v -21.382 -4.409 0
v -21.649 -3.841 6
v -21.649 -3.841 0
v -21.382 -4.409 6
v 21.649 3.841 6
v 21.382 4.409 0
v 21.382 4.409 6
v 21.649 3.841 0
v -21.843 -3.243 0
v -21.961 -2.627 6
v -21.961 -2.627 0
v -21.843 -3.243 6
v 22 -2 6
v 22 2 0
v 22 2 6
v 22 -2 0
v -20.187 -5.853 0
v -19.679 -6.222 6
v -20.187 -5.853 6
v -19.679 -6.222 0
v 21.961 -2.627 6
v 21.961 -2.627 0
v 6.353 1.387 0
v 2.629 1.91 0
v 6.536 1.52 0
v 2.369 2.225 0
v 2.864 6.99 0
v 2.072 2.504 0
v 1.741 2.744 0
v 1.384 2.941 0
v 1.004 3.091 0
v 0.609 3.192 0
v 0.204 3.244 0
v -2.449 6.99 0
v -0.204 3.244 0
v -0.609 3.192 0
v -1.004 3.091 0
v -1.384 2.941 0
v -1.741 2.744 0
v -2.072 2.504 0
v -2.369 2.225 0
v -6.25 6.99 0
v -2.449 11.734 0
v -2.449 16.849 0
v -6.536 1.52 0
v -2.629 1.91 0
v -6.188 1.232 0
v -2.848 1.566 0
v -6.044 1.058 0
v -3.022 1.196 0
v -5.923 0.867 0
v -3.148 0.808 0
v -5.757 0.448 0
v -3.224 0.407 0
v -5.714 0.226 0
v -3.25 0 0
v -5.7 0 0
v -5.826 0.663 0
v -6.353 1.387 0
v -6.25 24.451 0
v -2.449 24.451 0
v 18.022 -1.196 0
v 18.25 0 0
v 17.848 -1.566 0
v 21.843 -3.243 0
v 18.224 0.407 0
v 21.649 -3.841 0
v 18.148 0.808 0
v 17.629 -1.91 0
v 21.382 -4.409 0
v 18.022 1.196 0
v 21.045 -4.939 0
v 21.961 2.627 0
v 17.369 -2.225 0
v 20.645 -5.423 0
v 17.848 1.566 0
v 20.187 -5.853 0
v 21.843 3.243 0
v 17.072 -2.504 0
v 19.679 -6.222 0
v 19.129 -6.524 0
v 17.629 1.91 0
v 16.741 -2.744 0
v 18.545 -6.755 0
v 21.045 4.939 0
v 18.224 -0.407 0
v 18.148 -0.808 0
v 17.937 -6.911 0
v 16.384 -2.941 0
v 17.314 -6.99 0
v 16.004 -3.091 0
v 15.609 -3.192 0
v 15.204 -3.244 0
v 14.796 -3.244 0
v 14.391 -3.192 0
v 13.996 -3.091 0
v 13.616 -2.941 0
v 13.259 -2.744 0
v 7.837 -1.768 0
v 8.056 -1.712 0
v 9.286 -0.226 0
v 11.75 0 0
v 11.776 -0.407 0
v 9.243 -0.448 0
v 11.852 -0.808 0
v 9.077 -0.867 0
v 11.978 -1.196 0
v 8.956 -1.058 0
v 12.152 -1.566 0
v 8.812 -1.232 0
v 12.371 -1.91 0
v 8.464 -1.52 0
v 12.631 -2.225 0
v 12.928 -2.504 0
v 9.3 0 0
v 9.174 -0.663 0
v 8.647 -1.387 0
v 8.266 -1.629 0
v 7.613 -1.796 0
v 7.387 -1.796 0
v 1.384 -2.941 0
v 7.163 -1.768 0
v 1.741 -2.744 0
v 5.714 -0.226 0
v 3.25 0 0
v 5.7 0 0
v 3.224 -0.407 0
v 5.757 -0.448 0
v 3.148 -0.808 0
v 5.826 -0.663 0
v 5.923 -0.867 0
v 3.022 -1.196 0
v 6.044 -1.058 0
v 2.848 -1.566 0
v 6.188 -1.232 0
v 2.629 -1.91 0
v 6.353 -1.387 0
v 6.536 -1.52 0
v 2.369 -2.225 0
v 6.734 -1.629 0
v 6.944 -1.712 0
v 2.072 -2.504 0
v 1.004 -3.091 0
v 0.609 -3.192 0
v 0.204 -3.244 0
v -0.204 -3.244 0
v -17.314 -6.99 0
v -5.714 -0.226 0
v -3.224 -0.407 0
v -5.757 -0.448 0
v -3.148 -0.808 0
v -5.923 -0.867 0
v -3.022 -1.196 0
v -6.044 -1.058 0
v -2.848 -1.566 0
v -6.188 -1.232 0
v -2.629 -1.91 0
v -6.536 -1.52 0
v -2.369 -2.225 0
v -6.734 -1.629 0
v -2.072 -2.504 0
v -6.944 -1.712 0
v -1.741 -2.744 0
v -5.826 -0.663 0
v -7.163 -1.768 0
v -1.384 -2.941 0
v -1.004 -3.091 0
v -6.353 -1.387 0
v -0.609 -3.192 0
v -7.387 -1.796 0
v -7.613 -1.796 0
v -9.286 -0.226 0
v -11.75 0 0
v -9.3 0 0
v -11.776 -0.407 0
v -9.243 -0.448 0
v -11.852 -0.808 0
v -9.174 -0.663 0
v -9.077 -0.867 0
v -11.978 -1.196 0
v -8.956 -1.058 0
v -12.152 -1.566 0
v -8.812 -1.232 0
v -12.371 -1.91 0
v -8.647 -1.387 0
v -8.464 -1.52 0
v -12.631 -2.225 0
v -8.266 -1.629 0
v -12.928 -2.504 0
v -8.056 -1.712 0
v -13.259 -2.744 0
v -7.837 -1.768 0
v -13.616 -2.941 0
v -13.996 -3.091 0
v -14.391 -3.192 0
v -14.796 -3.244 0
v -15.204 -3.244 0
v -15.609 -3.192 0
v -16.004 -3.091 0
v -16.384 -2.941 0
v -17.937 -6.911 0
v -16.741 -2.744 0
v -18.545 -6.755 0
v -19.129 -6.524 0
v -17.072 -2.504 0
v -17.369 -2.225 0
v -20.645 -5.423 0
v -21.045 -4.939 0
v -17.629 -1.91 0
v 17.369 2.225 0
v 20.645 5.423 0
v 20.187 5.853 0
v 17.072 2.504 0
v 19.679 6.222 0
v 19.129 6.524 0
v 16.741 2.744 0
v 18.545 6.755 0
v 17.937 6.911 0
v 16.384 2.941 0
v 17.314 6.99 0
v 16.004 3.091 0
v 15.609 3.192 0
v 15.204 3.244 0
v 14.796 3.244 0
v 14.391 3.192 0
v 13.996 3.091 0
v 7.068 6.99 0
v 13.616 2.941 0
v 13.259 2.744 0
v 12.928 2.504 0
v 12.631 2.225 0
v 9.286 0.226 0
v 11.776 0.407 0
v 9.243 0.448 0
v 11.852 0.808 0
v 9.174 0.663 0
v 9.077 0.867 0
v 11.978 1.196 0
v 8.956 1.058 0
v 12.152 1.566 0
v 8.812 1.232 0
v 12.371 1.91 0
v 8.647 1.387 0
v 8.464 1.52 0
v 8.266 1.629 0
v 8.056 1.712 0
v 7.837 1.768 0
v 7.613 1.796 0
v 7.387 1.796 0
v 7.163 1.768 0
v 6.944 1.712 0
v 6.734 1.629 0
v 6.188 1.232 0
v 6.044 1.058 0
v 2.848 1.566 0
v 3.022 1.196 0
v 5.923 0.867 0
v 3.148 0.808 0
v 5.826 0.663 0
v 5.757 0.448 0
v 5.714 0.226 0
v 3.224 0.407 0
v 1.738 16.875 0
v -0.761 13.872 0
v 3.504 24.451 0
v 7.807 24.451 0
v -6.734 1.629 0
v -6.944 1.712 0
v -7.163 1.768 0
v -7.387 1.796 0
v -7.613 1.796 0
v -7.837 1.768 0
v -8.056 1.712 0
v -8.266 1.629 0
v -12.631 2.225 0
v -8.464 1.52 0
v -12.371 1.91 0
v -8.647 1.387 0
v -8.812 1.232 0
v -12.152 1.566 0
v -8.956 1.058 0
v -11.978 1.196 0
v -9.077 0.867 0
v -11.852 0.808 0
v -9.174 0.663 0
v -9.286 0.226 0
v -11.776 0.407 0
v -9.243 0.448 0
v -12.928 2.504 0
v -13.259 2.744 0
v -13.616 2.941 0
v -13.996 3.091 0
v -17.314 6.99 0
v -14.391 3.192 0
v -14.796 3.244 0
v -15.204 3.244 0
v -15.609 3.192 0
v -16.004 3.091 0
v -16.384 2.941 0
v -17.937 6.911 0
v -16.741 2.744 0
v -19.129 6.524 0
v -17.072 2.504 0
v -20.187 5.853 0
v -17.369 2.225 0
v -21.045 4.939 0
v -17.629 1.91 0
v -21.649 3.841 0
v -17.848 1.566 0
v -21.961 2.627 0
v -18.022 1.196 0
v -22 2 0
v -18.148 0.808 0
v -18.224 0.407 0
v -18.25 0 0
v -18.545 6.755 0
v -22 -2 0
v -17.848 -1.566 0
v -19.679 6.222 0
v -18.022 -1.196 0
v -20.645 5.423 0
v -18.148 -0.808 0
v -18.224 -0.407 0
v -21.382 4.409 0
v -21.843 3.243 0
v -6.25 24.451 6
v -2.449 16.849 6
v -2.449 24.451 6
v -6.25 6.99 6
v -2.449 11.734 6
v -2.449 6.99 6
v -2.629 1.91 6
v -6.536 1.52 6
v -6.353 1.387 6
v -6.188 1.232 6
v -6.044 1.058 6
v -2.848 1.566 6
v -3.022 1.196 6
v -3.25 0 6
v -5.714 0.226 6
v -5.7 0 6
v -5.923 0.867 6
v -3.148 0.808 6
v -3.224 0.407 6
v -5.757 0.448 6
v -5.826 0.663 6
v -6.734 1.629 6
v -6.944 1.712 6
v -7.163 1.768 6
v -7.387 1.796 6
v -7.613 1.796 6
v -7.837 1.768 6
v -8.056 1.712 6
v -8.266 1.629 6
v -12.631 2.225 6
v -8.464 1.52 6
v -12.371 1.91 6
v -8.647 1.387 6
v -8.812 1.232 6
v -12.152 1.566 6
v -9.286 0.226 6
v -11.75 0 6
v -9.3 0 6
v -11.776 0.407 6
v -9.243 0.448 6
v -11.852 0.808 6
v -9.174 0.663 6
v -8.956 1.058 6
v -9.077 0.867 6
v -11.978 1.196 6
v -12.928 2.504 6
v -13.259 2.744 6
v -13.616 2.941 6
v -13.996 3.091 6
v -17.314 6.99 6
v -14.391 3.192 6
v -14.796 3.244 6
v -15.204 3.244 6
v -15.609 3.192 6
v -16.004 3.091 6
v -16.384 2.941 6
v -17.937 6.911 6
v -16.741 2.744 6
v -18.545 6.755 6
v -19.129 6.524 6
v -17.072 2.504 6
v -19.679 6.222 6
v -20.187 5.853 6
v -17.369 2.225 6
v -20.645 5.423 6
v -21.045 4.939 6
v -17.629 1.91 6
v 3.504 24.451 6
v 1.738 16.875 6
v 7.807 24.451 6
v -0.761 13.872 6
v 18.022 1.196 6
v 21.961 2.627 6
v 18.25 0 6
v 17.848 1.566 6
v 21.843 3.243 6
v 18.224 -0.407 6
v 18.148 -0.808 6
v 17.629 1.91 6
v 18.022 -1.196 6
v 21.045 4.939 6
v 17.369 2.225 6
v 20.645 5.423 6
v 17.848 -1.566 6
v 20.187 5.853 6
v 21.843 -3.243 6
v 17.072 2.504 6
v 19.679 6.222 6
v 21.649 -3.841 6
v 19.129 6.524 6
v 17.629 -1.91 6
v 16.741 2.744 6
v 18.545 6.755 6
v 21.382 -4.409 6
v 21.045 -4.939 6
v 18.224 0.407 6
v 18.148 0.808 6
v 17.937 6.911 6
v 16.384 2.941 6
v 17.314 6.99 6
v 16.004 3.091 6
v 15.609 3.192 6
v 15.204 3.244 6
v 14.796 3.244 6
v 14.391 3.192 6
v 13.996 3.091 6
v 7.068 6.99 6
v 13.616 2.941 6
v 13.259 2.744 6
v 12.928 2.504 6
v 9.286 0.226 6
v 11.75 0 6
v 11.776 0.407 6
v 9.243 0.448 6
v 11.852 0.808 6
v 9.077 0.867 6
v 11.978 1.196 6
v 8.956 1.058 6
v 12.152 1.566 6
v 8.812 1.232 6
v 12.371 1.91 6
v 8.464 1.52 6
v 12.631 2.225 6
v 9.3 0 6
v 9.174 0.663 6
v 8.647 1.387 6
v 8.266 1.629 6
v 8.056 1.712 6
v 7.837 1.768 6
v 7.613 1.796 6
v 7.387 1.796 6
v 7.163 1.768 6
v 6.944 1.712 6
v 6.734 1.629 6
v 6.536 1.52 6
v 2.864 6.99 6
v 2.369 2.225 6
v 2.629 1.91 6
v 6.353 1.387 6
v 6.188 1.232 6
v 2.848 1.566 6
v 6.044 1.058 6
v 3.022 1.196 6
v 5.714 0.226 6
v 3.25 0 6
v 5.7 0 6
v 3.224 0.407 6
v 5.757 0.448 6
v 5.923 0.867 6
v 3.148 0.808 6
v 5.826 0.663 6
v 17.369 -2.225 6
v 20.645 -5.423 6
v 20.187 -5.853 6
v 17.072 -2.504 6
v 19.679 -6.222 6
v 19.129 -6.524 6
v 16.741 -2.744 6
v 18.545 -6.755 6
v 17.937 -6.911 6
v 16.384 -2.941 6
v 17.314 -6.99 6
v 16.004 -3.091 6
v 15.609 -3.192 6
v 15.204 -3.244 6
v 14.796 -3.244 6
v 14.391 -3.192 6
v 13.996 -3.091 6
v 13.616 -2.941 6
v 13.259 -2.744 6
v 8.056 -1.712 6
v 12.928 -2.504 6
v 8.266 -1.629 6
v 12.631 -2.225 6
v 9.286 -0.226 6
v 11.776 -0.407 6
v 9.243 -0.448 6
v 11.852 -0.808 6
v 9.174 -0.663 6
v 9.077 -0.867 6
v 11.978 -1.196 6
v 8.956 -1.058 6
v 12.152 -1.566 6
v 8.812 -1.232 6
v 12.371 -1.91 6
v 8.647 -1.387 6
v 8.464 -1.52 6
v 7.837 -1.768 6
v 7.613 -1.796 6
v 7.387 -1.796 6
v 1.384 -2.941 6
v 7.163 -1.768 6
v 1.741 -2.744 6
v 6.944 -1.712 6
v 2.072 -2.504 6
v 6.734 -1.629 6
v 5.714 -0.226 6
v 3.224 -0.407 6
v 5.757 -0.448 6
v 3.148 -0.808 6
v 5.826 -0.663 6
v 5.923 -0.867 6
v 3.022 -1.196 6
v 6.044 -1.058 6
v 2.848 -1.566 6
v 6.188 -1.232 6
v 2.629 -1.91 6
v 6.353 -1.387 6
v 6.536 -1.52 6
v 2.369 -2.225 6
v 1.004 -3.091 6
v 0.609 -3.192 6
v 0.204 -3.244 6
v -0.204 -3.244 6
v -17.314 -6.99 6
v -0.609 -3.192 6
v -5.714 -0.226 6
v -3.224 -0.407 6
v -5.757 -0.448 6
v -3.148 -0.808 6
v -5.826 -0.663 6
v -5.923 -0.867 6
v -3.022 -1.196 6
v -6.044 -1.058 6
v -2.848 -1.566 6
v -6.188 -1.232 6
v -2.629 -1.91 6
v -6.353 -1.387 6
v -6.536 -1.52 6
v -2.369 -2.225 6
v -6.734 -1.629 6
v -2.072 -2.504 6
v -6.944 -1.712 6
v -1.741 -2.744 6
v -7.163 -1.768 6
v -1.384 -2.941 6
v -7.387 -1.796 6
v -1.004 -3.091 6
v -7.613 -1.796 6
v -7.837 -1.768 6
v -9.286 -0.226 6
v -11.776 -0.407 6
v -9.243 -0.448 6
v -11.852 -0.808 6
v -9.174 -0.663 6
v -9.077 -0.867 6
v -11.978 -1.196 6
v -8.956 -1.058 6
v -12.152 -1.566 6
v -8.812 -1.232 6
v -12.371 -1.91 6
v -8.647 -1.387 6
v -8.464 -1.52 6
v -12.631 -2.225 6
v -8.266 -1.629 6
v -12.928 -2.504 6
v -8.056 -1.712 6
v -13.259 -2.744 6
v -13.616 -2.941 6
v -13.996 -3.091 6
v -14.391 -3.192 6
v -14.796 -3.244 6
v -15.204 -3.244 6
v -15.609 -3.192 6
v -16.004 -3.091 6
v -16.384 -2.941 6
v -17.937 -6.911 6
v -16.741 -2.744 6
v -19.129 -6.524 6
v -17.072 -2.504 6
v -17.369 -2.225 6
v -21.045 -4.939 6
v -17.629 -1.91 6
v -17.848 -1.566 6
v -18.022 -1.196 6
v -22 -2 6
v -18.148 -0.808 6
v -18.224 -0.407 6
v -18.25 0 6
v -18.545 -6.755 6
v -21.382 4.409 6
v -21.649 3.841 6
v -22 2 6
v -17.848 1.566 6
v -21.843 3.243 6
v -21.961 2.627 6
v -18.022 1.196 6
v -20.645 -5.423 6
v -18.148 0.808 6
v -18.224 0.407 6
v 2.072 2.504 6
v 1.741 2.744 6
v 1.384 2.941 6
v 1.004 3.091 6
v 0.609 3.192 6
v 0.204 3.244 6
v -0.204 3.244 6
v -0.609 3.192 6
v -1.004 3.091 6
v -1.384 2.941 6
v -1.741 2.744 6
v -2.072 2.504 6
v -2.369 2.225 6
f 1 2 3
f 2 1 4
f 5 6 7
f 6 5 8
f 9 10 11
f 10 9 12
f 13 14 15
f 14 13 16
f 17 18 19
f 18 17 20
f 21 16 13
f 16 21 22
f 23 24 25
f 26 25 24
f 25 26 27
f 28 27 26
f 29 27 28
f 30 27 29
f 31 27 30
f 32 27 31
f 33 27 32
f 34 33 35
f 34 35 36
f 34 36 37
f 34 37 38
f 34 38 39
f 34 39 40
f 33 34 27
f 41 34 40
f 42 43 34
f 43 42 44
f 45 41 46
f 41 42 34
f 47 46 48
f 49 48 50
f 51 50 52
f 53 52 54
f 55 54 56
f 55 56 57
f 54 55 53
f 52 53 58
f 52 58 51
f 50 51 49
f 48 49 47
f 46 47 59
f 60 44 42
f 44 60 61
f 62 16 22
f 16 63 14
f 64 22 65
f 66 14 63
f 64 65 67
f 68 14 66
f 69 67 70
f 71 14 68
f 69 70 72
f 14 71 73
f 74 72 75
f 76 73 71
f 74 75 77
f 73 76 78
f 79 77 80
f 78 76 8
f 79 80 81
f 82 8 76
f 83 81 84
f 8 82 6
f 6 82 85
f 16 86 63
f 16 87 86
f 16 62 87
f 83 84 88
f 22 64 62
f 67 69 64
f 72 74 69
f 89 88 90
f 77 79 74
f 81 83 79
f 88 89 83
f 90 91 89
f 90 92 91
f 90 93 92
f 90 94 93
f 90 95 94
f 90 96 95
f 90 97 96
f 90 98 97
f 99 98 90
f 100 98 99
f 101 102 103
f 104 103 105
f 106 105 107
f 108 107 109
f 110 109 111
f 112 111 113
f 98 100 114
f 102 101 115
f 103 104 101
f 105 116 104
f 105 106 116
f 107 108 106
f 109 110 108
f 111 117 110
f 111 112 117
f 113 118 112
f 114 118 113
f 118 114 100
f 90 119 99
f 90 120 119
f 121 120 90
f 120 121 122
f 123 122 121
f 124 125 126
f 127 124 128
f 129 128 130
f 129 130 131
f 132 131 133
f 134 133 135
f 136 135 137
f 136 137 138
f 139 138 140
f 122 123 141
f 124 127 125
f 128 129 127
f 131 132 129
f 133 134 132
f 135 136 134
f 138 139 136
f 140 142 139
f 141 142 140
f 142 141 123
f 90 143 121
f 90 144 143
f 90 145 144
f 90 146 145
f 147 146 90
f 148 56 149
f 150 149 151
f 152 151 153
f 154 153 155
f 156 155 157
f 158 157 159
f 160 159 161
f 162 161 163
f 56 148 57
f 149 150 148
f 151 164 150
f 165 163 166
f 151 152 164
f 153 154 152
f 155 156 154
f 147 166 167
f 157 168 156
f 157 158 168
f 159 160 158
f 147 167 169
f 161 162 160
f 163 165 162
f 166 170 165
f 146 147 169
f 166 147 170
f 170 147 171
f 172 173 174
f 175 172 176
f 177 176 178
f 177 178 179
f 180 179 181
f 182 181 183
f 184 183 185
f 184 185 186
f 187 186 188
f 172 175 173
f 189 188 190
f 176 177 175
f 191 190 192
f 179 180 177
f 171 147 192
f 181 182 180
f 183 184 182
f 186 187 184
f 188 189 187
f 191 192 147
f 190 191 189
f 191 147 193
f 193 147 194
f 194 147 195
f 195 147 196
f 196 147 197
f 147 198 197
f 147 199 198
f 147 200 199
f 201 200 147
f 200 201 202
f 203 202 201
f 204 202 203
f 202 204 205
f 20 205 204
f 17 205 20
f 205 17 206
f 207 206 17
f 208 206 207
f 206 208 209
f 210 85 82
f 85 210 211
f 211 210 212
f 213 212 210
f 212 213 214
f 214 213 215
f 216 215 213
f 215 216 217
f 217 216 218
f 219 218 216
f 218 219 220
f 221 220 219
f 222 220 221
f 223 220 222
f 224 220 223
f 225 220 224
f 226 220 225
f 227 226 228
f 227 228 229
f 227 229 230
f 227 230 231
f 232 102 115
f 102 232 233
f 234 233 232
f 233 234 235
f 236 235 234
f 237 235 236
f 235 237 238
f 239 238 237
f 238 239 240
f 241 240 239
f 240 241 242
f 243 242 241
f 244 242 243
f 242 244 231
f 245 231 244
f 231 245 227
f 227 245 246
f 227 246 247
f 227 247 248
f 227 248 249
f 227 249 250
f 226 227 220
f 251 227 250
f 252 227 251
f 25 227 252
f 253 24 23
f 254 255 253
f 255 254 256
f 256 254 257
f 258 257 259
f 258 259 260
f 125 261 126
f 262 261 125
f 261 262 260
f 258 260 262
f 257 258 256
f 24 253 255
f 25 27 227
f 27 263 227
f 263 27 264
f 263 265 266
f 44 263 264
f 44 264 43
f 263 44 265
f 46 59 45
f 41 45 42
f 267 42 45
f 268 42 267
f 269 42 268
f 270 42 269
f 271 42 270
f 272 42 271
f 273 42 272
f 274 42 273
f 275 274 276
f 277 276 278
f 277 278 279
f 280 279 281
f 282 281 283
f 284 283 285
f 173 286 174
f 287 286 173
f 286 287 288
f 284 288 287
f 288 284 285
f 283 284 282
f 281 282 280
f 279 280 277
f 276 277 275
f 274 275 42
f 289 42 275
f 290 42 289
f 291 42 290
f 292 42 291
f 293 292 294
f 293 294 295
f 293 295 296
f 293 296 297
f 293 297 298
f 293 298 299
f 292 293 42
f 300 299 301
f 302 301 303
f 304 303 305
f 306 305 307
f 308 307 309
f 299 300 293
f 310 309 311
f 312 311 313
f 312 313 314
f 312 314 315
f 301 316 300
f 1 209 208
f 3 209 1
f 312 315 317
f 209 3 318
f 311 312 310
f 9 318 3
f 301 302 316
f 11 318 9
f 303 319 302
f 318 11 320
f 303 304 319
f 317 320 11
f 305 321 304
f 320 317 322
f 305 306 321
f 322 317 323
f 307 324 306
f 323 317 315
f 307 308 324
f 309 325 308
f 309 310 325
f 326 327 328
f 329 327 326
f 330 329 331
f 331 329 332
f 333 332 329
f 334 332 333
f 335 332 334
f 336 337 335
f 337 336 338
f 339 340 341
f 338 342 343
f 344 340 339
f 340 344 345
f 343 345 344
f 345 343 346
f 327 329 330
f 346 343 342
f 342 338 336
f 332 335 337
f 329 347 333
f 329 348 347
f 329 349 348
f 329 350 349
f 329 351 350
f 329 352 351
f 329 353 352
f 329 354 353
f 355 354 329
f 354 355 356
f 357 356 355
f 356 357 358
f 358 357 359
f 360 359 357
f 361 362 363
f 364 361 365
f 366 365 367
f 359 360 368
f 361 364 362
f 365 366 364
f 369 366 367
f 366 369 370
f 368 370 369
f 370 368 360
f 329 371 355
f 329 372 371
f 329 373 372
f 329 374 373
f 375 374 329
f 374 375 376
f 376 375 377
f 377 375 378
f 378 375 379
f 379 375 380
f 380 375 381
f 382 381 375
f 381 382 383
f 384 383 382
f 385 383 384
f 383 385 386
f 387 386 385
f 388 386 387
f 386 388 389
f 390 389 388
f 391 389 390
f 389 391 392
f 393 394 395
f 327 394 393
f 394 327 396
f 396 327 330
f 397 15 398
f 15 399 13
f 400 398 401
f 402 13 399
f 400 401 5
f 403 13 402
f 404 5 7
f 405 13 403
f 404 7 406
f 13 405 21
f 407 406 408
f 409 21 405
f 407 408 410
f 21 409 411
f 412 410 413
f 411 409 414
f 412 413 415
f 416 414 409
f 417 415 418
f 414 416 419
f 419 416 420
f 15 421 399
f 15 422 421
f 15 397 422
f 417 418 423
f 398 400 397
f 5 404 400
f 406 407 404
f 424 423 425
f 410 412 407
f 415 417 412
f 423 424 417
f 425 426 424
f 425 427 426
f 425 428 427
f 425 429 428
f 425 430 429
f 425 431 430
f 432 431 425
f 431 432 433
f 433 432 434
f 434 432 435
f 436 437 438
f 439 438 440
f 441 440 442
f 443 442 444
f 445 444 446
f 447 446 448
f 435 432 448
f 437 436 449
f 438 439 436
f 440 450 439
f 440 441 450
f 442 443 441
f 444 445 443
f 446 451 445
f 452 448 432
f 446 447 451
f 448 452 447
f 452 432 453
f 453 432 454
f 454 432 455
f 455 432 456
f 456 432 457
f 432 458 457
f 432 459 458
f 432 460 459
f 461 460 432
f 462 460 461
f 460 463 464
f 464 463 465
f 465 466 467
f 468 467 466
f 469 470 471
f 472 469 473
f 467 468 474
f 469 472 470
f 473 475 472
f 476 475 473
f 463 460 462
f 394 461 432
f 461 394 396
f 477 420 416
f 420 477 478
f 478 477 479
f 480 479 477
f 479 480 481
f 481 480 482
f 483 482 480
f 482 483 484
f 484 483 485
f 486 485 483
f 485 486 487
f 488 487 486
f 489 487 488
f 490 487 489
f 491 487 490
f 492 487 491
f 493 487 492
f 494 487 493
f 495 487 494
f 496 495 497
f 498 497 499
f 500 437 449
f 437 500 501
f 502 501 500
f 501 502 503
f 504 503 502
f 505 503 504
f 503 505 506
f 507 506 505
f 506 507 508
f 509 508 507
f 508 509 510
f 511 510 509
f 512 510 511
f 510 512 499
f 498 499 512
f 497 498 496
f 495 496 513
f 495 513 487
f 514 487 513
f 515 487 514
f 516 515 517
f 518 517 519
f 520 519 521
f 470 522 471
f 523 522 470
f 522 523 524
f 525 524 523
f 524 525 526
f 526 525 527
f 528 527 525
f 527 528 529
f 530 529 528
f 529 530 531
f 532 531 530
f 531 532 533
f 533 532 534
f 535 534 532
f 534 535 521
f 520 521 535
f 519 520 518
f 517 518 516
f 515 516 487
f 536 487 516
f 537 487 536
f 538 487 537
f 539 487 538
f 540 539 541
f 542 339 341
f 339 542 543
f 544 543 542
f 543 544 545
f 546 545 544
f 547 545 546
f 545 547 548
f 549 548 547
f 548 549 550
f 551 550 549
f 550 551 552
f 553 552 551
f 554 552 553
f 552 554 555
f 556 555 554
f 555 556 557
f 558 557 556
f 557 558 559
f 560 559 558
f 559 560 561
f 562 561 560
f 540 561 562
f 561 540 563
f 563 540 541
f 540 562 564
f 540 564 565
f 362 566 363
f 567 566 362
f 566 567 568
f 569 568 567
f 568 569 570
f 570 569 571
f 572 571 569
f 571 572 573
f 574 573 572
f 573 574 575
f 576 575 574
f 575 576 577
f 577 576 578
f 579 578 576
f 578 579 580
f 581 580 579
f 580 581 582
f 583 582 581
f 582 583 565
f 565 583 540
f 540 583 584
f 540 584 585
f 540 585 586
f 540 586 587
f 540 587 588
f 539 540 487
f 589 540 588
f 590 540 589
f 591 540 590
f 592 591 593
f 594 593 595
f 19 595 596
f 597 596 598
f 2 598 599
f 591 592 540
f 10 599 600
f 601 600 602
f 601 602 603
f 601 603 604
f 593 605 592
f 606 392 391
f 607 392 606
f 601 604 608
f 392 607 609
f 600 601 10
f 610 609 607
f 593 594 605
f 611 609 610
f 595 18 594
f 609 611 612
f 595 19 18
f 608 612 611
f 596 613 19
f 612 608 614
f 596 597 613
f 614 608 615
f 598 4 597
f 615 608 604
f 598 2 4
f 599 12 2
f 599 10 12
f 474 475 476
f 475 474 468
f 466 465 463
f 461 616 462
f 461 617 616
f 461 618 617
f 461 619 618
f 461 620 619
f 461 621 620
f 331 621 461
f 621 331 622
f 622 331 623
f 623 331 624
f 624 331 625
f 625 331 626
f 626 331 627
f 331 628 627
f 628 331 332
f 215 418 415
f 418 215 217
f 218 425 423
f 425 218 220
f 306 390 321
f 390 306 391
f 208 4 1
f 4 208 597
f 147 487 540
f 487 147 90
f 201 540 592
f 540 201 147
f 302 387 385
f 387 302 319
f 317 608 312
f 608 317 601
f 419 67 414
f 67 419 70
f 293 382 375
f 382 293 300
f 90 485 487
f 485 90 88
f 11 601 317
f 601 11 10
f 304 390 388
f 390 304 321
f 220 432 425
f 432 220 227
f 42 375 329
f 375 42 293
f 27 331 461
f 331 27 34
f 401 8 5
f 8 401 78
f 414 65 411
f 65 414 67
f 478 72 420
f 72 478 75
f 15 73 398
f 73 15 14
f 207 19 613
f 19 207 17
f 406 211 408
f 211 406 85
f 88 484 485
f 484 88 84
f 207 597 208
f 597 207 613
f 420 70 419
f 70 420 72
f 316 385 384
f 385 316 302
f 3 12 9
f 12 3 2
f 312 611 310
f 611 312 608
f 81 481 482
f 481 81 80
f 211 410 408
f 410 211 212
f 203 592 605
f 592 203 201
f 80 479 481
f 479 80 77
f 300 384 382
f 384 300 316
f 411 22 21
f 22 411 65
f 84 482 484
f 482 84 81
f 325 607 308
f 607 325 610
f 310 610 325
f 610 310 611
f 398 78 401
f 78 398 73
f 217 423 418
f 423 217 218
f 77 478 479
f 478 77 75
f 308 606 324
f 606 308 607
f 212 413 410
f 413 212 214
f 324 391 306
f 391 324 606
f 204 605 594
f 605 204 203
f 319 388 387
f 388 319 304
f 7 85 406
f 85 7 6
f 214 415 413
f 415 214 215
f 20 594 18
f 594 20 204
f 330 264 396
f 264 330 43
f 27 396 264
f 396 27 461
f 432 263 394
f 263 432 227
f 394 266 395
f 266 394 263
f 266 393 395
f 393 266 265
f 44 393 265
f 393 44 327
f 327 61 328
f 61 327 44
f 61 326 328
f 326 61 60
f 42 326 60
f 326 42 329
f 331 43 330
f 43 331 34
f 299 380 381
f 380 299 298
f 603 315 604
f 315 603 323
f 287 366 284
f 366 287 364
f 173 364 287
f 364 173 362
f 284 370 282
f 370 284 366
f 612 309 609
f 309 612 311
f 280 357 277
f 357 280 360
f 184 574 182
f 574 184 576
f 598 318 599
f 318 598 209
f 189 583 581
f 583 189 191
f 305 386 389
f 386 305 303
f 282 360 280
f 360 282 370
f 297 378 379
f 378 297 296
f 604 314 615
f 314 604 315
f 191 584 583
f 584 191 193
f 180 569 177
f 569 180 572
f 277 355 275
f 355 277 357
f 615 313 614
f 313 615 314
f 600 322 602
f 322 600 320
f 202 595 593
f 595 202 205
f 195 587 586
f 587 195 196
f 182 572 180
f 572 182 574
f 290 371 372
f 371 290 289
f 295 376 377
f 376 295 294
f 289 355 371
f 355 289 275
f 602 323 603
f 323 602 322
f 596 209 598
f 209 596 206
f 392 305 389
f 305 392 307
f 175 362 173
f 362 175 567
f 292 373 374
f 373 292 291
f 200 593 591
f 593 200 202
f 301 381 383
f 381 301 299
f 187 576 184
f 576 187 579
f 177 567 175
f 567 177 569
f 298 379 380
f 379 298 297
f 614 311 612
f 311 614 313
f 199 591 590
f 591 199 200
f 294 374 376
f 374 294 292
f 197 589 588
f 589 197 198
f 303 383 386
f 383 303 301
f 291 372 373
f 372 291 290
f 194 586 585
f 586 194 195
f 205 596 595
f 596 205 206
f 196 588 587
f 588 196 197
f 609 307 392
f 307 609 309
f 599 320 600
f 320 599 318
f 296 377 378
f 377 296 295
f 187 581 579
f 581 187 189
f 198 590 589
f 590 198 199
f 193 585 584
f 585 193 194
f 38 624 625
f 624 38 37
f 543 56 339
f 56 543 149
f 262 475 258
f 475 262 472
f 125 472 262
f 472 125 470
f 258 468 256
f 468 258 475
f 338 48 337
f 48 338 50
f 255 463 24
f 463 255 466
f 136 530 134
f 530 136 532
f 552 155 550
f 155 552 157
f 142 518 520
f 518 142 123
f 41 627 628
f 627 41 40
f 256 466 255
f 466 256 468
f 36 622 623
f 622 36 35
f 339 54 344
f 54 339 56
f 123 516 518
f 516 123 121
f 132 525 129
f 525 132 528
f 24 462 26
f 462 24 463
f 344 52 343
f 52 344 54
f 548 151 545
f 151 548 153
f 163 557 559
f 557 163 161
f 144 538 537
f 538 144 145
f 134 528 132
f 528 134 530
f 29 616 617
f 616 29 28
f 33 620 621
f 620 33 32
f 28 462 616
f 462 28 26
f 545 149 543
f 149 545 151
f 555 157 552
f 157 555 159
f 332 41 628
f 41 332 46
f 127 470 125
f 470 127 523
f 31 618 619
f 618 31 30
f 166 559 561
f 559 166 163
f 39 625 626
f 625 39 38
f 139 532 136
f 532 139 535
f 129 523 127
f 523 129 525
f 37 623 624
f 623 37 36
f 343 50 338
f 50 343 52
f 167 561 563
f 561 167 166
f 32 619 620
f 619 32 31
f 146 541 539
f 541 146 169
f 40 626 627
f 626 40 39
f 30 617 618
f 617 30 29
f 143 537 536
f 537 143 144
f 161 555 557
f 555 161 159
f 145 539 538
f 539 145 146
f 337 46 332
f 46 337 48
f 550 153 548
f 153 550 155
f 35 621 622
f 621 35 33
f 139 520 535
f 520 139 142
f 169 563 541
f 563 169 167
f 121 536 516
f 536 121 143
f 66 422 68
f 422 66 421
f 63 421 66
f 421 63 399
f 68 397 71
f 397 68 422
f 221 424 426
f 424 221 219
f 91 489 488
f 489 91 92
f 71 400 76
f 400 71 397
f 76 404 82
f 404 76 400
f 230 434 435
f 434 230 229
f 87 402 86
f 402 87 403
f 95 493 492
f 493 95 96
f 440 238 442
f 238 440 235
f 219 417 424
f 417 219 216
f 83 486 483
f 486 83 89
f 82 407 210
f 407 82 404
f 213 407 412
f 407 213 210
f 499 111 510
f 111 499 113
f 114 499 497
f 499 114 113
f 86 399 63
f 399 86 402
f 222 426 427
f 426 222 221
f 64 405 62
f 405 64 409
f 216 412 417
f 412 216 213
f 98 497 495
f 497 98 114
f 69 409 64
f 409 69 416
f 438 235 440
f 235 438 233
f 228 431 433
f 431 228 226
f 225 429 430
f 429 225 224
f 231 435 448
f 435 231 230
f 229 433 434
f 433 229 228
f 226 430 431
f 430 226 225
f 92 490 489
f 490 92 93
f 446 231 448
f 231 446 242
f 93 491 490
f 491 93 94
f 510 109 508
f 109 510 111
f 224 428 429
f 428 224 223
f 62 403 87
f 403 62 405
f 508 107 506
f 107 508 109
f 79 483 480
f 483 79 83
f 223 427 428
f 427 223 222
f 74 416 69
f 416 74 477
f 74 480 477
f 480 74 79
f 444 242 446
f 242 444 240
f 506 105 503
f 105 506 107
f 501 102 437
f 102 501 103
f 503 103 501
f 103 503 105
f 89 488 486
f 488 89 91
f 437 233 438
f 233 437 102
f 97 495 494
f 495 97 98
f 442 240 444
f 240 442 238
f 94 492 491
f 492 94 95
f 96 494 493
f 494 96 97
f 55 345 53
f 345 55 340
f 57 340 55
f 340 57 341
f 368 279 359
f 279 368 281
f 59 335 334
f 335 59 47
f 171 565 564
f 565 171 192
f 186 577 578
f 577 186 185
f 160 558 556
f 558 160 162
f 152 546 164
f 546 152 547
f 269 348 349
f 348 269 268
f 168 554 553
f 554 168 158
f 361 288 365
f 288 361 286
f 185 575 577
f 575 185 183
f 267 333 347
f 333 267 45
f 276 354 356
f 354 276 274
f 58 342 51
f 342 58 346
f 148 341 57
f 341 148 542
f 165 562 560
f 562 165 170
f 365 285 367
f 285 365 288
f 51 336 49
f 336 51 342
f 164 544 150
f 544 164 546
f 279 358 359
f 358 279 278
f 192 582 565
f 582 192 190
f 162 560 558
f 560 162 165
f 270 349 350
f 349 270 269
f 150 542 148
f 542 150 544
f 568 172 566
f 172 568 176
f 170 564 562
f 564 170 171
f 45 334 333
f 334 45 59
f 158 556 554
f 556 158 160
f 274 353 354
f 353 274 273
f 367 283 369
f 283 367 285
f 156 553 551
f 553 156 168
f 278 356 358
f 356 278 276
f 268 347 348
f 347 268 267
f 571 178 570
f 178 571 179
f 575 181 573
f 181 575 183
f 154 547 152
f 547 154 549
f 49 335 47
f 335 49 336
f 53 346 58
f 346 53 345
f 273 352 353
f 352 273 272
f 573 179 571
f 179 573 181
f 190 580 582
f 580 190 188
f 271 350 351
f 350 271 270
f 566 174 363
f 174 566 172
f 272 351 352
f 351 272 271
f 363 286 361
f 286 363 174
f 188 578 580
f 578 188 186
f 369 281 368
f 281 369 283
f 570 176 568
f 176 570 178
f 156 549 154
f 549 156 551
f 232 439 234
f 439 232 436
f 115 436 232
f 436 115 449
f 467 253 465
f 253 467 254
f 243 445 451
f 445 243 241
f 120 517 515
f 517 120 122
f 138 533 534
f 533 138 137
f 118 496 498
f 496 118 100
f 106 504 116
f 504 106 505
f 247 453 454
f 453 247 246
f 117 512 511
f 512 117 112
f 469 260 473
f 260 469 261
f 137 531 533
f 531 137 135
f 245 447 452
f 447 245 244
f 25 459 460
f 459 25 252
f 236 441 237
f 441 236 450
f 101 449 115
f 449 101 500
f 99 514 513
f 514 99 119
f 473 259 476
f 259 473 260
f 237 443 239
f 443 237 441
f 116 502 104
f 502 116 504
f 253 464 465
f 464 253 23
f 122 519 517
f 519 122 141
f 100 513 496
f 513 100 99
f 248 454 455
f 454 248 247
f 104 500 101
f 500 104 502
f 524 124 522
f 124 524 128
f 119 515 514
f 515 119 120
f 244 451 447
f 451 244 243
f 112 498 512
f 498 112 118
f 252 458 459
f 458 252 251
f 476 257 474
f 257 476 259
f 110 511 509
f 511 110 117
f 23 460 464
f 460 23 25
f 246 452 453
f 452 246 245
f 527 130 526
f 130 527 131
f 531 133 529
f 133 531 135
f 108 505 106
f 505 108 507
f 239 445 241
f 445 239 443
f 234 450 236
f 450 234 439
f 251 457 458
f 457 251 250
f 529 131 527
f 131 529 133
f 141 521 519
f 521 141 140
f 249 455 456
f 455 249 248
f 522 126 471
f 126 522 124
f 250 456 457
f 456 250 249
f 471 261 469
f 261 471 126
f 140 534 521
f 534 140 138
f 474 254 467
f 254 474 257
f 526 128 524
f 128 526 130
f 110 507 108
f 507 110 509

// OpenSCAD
$fn = 50;


difference() {
	union() {
		hull() {
			translate(v = [-17.0000000000, 2.0000000000, 0]) {
				cylinder(h = 6, r = 5);
			}
			translate(v = [17.0000000000, 2.0000000000, 0]) {
				cylinder(h = 6, r = 5);
			}
			translate(v = [-17.0000000000, -2.0000000000, 0]) {
				cylinder(h = 6, r = 5);
			}
			translate(v = [17.0000000000, -2.0000000000, 0]) {
				cylinder(h = 6, r = 5);
			}
		}
		translate(v = [0, 24, 0]) {
			linear_extrude(height = 6) {
				text(font = "DejaVu Sans Mono:style=Bold", halign = "center", size = 19.0000000000, text = "K", valign = "top");
			}
		}
	}
	union() {
		translate(v = [-15.0000000000, 0.0000000000, 0]) {
			translate(v = [0, 0, -100]) {
				cylinder(h = 200, r = 3.2500000000);
			}
		}
		translate(v = [0, 0, -100]) {
			cylinder(h = 200, r = 3.2500000000);
		}
		translate(v = [15.0000000000, 0.0000000000, 0]) {
			translate(v = [0, 0, -100]) {
				cylinder(h = 200, r = 3.2500000000);
			}
		}
		translate(v = [-15.0000000000, 0.0000000000, 0]) {
			translate(v = [0, 0, -100]) {
				cylinder(h = 200, r = 1.8000000000);
			}
		}
		translate(v = [-7.5000000000, 0.0000000000, 0]) {
			translate(v = [0, 0, -100]) {
				cylinder(h = 200, r = 1.8000000000);
			}
		}
		translate(v = [0, 0, -100]) {
			cylinder(h = 200, r = 1.8000000000);
		}
		translate(v = [7.5000000000, 0.0000000000, 0]) {
			translate(v = [0, 0, -100]) {
				cylinder(h = 200, r = 1.8000000000);
			}
		}
		translate(v = [15.0000000000, 0.0000000000, 0]) {
			translate(v = [0, 0, -100]) {
				cylinder(h = 200, r = 1.8000000000);
			}
		}
	}
}
